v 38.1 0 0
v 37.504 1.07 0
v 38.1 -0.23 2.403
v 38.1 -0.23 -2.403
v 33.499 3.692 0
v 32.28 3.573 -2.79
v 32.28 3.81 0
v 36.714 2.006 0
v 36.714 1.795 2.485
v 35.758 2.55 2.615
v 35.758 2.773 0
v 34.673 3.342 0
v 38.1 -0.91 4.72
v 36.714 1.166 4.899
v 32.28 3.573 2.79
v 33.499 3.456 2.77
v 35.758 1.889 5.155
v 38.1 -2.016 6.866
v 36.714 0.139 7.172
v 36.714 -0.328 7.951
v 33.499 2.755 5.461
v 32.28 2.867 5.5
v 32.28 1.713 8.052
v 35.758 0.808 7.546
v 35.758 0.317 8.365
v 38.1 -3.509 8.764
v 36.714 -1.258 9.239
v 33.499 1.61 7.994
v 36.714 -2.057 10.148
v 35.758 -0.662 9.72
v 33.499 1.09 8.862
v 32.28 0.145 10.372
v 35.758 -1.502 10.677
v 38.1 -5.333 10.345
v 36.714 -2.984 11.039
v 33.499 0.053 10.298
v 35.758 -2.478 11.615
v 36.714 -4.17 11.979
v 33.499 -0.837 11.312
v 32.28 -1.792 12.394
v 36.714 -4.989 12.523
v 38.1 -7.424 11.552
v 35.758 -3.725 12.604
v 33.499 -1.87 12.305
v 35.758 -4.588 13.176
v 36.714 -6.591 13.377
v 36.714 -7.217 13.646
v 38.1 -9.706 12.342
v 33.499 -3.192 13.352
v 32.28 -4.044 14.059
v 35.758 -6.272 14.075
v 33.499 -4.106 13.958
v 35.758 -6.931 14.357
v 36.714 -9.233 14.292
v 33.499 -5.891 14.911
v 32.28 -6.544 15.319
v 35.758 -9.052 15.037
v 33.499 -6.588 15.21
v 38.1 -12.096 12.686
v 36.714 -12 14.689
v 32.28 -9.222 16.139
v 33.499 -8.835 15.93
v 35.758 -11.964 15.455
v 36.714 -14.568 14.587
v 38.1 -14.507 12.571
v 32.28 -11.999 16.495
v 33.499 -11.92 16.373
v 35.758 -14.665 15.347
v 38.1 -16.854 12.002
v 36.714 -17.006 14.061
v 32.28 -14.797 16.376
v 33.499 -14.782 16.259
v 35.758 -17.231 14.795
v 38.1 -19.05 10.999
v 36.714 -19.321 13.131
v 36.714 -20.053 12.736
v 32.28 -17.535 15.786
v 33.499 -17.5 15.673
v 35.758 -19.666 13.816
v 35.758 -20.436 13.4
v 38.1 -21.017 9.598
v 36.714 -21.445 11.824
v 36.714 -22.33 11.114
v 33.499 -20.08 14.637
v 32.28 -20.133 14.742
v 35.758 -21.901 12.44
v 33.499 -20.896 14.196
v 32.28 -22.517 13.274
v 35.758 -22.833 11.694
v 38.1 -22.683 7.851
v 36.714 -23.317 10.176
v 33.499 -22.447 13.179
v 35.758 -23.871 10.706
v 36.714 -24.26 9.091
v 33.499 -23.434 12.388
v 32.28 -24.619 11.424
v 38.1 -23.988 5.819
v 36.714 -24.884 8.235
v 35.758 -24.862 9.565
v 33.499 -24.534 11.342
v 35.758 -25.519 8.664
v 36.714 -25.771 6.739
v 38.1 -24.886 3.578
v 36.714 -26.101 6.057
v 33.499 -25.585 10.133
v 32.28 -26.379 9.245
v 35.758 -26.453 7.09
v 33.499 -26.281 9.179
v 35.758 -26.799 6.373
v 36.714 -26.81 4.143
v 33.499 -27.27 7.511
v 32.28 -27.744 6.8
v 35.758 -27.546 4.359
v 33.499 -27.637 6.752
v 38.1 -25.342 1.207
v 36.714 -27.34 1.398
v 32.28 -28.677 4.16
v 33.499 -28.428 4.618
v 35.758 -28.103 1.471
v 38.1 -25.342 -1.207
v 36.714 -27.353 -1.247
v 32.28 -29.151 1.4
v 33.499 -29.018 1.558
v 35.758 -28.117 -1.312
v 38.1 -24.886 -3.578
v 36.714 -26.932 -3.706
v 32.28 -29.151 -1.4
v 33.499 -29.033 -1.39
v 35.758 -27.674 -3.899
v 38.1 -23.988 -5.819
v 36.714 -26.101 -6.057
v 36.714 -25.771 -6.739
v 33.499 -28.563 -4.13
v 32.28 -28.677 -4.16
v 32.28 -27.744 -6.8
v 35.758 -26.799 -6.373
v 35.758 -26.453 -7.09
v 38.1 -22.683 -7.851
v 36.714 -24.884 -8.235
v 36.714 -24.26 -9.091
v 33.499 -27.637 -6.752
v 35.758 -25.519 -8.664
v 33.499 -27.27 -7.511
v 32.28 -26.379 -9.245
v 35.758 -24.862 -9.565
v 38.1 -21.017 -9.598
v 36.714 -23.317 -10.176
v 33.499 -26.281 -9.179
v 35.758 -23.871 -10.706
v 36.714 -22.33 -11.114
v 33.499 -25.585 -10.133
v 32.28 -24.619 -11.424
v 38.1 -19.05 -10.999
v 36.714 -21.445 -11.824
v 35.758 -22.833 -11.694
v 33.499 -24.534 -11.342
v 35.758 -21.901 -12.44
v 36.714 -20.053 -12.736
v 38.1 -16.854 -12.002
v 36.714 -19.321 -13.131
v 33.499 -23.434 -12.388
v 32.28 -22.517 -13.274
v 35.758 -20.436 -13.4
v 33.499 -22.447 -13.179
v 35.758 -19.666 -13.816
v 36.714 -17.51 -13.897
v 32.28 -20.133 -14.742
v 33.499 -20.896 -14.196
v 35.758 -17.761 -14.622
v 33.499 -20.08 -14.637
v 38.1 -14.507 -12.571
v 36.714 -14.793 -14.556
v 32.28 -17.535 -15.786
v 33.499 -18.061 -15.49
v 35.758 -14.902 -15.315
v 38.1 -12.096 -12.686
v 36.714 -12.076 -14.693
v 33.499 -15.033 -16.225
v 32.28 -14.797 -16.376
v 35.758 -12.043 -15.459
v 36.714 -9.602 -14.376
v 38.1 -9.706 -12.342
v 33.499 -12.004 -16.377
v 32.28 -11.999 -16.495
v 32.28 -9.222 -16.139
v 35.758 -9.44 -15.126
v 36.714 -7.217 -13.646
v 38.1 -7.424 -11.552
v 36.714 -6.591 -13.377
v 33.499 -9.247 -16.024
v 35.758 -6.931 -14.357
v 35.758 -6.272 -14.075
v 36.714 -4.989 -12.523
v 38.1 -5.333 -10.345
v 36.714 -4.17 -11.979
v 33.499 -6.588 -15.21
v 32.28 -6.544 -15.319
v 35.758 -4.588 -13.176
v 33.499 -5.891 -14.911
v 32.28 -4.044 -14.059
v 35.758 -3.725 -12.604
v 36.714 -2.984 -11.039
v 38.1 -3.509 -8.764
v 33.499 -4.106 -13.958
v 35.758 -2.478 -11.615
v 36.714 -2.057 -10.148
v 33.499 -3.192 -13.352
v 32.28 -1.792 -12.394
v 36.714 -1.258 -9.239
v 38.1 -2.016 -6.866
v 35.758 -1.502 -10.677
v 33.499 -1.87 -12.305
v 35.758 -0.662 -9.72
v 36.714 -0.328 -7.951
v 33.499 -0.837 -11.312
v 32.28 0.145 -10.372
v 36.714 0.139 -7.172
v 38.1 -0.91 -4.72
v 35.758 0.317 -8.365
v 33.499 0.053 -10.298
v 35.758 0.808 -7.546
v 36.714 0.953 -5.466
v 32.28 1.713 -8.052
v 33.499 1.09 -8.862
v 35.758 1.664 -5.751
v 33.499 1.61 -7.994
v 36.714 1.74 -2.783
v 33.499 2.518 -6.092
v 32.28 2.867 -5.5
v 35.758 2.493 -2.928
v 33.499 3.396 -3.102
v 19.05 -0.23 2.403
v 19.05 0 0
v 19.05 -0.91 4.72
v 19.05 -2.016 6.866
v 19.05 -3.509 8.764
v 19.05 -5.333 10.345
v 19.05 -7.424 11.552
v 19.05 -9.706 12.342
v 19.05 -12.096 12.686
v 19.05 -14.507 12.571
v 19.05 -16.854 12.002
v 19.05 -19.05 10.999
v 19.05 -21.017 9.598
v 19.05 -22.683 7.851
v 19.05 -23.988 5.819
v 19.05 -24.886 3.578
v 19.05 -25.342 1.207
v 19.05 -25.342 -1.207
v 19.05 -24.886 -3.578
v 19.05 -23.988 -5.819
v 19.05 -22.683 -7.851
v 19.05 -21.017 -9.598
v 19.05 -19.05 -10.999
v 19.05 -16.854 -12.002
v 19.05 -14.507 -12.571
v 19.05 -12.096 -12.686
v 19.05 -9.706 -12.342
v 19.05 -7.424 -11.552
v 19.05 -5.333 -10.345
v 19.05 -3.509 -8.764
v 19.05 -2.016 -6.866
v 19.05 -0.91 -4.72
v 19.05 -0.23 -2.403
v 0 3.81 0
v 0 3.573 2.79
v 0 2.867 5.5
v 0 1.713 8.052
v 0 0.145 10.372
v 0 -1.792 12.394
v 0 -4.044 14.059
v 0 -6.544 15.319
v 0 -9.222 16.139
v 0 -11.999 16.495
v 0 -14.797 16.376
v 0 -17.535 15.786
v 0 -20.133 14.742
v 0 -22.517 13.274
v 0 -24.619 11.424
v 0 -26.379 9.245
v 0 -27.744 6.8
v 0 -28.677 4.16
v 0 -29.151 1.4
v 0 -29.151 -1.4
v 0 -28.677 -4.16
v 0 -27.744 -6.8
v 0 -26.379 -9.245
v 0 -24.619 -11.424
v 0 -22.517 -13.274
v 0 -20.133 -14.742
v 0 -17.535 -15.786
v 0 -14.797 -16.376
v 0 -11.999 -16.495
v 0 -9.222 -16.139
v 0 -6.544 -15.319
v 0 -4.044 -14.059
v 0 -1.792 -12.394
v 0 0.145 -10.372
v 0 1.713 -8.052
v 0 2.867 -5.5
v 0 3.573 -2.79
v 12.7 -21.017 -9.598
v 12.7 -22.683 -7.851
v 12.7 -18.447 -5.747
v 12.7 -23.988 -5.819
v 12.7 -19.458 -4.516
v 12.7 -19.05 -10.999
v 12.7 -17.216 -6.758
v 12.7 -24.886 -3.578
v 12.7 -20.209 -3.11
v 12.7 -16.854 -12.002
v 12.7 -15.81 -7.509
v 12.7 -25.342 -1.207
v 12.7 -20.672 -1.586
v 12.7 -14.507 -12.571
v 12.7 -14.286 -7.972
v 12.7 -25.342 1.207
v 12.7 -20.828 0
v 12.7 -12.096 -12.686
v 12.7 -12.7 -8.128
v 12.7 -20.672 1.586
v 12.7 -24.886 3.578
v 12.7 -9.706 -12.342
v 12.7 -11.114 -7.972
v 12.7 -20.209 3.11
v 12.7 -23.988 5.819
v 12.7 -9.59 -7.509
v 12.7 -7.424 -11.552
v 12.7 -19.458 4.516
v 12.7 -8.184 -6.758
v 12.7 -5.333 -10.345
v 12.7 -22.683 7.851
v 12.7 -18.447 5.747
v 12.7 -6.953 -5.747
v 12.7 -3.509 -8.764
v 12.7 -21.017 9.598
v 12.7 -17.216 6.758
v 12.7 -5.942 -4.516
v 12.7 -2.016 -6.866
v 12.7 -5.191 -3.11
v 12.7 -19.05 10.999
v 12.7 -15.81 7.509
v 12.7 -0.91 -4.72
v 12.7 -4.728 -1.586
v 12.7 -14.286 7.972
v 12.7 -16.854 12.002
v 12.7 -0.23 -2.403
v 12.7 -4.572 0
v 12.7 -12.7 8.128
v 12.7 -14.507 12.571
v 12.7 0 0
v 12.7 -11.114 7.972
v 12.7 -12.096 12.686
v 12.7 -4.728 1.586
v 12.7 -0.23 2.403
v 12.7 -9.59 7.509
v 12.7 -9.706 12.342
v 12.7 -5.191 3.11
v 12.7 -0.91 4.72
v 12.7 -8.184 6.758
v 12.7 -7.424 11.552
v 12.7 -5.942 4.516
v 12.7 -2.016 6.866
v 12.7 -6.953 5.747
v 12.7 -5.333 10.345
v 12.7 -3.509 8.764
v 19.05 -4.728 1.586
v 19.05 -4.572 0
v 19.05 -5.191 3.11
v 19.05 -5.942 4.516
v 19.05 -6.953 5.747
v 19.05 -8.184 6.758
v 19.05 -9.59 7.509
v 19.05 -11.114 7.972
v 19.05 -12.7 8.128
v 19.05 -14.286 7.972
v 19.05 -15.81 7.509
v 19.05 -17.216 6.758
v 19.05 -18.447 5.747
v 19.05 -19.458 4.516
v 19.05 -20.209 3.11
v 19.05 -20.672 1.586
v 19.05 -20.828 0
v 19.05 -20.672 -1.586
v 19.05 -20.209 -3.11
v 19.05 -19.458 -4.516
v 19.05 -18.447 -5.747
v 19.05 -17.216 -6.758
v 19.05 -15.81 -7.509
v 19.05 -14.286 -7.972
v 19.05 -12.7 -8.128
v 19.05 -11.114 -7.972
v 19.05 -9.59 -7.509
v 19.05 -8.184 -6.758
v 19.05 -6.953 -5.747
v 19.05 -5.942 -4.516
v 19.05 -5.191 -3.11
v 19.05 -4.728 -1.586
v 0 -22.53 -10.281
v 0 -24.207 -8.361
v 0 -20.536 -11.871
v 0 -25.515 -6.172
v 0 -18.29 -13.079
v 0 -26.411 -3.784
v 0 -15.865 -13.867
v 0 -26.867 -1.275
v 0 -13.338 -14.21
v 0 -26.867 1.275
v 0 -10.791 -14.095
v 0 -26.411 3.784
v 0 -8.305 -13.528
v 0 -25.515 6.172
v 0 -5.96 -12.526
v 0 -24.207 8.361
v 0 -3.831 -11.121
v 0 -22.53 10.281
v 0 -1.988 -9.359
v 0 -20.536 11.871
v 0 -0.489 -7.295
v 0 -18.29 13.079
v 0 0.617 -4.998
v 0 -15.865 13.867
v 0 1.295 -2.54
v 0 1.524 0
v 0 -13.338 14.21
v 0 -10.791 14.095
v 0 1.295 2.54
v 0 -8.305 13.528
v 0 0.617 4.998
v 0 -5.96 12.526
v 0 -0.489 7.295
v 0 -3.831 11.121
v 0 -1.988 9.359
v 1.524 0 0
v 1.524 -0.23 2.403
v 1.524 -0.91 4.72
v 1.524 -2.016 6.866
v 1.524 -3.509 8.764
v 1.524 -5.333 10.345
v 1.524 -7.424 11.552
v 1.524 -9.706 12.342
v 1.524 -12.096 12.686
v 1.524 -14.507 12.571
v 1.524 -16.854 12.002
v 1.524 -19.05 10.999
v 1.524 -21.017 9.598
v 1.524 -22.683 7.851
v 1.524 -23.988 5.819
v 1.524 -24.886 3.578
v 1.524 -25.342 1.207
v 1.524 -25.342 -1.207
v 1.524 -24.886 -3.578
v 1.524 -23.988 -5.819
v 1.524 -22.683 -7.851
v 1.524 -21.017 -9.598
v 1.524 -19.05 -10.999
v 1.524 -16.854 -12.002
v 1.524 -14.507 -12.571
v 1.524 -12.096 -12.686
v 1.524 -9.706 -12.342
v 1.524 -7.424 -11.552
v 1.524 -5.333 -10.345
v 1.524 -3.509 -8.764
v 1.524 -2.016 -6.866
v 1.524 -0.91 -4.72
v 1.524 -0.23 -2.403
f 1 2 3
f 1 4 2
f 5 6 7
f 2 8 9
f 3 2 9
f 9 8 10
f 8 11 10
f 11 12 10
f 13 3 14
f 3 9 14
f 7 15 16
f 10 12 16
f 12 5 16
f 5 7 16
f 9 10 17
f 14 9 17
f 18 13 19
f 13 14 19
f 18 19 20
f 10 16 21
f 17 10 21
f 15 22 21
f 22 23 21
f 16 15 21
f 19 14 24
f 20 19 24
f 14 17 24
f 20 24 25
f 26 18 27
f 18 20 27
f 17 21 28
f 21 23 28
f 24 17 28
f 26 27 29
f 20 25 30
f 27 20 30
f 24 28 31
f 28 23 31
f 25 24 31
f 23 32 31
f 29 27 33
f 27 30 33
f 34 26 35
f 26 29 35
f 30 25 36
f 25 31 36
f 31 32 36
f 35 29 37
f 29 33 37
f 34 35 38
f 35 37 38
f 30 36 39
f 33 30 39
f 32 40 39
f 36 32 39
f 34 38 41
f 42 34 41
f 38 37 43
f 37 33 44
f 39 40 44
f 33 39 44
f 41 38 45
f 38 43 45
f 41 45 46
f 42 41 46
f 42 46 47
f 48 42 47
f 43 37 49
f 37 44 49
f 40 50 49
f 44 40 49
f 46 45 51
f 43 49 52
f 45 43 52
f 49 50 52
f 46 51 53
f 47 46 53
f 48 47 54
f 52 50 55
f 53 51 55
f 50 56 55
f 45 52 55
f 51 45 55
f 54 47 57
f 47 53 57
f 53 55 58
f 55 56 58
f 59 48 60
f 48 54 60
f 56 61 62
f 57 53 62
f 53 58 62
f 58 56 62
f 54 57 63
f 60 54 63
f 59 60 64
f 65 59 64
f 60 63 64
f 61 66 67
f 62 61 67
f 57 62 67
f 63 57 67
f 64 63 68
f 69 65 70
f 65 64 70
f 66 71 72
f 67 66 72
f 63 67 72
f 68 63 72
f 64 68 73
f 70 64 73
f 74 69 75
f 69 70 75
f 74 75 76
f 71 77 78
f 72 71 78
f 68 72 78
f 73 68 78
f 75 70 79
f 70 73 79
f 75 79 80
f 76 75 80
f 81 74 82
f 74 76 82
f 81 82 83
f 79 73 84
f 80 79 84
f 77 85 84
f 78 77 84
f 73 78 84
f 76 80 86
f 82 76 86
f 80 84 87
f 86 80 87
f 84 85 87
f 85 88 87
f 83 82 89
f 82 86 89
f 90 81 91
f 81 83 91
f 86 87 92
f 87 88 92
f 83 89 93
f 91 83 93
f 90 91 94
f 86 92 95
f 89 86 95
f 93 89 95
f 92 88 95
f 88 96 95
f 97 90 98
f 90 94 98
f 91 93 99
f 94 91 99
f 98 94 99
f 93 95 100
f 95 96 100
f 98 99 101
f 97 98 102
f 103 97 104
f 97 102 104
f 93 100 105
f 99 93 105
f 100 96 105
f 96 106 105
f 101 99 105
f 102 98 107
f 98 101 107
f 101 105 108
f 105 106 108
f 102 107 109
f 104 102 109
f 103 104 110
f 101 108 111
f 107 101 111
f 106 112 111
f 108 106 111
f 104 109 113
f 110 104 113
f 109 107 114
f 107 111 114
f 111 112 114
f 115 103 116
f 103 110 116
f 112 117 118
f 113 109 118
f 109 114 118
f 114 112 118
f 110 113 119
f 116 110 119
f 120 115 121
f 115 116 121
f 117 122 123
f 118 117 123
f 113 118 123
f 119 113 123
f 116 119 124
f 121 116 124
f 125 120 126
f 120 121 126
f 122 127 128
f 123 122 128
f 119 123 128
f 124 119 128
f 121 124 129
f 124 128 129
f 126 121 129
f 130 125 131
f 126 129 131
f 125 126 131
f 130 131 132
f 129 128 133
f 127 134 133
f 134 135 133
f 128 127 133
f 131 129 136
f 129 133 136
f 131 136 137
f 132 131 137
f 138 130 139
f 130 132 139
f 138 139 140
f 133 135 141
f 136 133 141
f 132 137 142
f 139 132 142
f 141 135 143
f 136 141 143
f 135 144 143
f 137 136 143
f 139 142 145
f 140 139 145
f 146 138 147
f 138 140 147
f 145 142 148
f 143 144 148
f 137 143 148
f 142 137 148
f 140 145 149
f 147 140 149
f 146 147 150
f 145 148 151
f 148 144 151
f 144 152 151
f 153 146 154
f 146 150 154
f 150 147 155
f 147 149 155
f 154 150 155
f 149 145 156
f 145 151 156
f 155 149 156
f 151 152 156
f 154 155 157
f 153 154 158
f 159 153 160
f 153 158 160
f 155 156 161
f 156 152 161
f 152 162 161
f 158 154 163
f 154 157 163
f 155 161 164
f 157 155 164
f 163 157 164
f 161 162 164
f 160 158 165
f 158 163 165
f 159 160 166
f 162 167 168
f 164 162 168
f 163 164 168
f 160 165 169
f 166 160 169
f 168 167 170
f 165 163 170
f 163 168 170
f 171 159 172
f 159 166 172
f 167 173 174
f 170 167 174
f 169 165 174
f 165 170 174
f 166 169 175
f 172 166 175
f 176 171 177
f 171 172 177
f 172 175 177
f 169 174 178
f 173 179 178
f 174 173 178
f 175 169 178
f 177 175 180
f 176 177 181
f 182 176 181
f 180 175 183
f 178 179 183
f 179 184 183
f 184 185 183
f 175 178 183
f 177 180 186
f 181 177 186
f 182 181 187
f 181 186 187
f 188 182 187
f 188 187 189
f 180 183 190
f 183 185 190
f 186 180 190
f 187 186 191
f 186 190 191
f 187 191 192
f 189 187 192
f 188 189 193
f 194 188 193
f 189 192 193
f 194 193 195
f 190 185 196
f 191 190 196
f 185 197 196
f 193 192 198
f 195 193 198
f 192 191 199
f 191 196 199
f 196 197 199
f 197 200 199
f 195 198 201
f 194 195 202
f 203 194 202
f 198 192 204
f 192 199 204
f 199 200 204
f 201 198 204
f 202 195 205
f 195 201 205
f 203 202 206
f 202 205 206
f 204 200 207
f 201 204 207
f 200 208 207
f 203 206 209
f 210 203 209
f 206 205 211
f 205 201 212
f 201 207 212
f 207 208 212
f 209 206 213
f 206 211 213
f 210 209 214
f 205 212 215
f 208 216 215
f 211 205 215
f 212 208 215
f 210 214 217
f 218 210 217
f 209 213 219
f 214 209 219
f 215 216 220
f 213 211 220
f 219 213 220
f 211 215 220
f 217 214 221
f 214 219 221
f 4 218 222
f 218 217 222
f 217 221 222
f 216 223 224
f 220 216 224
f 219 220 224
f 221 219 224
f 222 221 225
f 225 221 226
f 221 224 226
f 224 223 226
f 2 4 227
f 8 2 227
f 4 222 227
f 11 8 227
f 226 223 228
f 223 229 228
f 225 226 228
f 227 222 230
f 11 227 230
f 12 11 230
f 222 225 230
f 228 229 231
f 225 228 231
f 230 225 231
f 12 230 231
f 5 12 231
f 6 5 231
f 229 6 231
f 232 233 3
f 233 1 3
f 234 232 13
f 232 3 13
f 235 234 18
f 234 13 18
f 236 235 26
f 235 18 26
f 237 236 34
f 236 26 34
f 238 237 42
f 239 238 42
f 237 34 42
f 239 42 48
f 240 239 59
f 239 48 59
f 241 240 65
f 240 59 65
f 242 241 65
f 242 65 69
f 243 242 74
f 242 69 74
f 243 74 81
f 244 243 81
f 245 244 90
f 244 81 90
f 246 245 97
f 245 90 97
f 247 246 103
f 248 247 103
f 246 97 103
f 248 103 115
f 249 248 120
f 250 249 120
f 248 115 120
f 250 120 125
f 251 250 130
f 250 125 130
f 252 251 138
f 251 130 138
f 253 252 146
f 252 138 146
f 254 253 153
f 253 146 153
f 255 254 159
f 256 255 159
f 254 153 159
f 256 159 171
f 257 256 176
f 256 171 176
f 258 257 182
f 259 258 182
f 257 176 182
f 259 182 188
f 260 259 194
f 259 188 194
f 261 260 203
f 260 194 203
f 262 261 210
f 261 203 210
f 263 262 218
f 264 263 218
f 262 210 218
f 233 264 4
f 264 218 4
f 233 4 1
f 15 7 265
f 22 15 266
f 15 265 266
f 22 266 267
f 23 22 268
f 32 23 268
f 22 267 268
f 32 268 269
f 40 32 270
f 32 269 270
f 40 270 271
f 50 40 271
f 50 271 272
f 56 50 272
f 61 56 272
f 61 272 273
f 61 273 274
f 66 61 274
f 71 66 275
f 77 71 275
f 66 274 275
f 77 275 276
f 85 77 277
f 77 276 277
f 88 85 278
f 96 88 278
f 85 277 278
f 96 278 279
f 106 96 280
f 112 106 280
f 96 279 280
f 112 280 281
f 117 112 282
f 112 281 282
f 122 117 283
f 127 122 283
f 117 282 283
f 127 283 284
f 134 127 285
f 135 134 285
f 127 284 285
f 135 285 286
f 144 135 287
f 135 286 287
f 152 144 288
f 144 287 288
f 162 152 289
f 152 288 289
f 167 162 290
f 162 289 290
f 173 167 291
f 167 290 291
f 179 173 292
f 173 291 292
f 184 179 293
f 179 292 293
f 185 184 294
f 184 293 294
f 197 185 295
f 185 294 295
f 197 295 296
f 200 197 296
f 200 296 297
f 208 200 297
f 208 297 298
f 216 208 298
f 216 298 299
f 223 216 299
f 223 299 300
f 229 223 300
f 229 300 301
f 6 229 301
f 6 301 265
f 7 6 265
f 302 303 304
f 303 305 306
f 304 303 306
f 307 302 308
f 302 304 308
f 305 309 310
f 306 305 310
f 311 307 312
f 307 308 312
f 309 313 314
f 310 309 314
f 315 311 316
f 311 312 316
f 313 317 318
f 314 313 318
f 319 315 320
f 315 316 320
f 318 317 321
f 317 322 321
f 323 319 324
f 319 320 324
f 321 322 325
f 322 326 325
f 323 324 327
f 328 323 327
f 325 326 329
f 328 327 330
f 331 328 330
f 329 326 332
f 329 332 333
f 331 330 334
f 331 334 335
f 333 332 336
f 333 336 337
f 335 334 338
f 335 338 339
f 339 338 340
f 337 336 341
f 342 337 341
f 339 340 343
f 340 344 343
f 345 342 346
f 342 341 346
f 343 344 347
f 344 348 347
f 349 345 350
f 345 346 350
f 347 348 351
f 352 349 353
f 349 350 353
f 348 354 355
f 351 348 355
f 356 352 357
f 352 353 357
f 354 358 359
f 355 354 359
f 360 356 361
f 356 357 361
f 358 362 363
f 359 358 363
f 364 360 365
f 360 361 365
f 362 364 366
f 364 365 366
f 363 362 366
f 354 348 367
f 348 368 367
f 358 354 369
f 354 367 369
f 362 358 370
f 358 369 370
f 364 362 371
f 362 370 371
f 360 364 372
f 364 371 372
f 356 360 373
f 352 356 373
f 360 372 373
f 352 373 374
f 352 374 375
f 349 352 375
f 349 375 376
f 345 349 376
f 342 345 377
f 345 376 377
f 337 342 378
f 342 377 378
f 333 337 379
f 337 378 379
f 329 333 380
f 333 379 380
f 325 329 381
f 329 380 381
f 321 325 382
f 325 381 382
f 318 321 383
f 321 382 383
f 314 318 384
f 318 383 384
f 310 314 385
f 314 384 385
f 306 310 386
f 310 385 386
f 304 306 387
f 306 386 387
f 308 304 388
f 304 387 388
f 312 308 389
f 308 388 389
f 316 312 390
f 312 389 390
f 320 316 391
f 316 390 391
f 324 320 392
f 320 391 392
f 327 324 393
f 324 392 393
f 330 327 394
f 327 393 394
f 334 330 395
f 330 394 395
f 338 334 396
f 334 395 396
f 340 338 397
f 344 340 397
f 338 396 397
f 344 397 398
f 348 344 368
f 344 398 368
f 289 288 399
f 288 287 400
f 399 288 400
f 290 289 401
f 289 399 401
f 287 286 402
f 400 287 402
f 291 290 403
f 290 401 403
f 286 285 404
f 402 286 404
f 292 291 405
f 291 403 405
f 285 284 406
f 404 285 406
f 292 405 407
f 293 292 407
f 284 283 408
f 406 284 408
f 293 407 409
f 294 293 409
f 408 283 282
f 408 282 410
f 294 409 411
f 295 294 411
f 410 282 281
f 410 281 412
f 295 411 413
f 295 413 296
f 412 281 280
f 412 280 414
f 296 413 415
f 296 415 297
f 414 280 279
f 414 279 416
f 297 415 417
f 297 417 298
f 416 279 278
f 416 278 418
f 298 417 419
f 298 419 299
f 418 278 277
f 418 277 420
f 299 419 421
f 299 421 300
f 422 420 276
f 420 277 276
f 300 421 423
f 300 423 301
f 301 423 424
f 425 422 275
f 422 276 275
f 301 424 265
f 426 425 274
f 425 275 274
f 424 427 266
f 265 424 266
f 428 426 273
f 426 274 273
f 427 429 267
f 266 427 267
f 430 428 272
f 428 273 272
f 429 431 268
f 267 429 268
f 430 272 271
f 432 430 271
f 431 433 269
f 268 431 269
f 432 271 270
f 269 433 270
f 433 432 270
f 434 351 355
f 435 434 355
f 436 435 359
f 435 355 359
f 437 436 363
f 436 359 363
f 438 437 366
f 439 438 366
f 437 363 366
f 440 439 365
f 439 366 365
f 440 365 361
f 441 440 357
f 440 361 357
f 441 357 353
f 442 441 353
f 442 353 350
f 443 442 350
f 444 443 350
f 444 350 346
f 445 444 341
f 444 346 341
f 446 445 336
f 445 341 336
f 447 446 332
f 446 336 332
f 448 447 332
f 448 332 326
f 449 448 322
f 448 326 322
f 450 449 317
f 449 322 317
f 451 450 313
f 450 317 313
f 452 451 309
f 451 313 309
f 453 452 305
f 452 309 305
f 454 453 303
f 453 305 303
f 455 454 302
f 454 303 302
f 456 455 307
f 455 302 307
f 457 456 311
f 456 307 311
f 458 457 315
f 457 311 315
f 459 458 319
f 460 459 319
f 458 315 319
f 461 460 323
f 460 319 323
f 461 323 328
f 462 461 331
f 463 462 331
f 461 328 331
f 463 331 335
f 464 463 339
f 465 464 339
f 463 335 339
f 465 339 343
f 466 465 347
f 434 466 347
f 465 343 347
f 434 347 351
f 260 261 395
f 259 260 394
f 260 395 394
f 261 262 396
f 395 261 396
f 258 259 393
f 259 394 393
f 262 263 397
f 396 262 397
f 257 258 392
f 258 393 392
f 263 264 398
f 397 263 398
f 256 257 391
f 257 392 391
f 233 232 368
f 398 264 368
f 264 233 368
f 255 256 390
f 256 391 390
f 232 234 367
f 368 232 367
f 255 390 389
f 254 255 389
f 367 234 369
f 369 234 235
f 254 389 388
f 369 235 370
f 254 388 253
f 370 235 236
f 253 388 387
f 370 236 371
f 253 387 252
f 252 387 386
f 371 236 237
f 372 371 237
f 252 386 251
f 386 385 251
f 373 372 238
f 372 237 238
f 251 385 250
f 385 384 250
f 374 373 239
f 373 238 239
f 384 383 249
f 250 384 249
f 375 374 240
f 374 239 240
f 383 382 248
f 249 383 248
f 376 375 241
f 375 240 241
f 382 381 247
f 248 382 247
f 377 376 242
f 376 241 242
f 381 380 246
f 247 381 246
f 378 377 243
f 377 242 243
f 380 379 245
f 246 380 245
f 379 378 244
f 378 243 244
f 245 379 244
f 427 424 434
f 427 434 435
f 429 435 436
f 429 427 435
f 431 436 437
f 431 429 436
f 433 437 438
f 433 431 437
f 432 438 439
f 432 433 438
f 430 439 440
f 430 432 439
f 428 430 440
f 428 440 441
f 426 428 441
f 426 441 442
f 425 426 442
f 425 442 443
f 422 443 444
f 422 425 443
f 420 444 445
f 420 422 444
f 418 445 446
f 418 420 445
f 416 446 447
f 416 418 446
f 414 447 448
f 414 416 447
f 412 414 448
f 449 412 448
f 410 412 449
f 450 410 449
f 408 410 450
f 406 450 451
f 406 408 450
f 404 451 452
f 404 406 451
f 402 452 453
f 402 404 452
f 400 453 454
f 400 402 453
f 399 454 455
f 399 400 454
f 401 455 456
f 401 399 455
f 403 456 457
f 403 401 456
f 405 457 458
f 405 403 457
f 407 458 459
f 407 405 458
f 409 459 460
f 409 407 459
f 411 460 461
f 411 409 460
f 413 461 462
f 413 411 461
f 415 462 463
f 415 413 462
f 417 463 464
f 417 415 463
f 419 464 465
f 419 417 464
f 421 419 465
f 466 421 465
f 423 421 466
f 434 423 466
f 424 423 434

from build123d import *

# Parameters (mm, degrees)
CHAMFER1_SIZE = 1.524


with BuildPart() as part:
    # Sketch1 → Revolve1 (revolve)
    with BuildSketch(Plane.XY):
        with BuildLine():
            Line((0, 0), (12.7, 0))
            Line((12.7, 0), (12.7, -4.572))
            Line((12.7, -4.572), (19.05, -4.572))
            Line((19.05, -4.572), (19.05, 0))
            Line((19.05, 0), (38.1, 0))
            ThreePointArc((38.1, 0), (35.758167108, 2.772791168), (32.280128867, 3.81))
            Line((32.280128867, 3.81), (0, 3.81))
            Line((0, 3.81), (0, 0))
        make_face()
    revolve(axis=Axis((-29.818959813, -12.7, 0), (1, 0, 0)))

    # Chamfer1
    chamfer1_edges = [part.edges().sort_by_distance(p)[0] for p in [
        (0, -25.4, 0),
    ]]
    chamfer(chamfer1_edges, length=CHAMFER1_SIZE)


solid = part.part
